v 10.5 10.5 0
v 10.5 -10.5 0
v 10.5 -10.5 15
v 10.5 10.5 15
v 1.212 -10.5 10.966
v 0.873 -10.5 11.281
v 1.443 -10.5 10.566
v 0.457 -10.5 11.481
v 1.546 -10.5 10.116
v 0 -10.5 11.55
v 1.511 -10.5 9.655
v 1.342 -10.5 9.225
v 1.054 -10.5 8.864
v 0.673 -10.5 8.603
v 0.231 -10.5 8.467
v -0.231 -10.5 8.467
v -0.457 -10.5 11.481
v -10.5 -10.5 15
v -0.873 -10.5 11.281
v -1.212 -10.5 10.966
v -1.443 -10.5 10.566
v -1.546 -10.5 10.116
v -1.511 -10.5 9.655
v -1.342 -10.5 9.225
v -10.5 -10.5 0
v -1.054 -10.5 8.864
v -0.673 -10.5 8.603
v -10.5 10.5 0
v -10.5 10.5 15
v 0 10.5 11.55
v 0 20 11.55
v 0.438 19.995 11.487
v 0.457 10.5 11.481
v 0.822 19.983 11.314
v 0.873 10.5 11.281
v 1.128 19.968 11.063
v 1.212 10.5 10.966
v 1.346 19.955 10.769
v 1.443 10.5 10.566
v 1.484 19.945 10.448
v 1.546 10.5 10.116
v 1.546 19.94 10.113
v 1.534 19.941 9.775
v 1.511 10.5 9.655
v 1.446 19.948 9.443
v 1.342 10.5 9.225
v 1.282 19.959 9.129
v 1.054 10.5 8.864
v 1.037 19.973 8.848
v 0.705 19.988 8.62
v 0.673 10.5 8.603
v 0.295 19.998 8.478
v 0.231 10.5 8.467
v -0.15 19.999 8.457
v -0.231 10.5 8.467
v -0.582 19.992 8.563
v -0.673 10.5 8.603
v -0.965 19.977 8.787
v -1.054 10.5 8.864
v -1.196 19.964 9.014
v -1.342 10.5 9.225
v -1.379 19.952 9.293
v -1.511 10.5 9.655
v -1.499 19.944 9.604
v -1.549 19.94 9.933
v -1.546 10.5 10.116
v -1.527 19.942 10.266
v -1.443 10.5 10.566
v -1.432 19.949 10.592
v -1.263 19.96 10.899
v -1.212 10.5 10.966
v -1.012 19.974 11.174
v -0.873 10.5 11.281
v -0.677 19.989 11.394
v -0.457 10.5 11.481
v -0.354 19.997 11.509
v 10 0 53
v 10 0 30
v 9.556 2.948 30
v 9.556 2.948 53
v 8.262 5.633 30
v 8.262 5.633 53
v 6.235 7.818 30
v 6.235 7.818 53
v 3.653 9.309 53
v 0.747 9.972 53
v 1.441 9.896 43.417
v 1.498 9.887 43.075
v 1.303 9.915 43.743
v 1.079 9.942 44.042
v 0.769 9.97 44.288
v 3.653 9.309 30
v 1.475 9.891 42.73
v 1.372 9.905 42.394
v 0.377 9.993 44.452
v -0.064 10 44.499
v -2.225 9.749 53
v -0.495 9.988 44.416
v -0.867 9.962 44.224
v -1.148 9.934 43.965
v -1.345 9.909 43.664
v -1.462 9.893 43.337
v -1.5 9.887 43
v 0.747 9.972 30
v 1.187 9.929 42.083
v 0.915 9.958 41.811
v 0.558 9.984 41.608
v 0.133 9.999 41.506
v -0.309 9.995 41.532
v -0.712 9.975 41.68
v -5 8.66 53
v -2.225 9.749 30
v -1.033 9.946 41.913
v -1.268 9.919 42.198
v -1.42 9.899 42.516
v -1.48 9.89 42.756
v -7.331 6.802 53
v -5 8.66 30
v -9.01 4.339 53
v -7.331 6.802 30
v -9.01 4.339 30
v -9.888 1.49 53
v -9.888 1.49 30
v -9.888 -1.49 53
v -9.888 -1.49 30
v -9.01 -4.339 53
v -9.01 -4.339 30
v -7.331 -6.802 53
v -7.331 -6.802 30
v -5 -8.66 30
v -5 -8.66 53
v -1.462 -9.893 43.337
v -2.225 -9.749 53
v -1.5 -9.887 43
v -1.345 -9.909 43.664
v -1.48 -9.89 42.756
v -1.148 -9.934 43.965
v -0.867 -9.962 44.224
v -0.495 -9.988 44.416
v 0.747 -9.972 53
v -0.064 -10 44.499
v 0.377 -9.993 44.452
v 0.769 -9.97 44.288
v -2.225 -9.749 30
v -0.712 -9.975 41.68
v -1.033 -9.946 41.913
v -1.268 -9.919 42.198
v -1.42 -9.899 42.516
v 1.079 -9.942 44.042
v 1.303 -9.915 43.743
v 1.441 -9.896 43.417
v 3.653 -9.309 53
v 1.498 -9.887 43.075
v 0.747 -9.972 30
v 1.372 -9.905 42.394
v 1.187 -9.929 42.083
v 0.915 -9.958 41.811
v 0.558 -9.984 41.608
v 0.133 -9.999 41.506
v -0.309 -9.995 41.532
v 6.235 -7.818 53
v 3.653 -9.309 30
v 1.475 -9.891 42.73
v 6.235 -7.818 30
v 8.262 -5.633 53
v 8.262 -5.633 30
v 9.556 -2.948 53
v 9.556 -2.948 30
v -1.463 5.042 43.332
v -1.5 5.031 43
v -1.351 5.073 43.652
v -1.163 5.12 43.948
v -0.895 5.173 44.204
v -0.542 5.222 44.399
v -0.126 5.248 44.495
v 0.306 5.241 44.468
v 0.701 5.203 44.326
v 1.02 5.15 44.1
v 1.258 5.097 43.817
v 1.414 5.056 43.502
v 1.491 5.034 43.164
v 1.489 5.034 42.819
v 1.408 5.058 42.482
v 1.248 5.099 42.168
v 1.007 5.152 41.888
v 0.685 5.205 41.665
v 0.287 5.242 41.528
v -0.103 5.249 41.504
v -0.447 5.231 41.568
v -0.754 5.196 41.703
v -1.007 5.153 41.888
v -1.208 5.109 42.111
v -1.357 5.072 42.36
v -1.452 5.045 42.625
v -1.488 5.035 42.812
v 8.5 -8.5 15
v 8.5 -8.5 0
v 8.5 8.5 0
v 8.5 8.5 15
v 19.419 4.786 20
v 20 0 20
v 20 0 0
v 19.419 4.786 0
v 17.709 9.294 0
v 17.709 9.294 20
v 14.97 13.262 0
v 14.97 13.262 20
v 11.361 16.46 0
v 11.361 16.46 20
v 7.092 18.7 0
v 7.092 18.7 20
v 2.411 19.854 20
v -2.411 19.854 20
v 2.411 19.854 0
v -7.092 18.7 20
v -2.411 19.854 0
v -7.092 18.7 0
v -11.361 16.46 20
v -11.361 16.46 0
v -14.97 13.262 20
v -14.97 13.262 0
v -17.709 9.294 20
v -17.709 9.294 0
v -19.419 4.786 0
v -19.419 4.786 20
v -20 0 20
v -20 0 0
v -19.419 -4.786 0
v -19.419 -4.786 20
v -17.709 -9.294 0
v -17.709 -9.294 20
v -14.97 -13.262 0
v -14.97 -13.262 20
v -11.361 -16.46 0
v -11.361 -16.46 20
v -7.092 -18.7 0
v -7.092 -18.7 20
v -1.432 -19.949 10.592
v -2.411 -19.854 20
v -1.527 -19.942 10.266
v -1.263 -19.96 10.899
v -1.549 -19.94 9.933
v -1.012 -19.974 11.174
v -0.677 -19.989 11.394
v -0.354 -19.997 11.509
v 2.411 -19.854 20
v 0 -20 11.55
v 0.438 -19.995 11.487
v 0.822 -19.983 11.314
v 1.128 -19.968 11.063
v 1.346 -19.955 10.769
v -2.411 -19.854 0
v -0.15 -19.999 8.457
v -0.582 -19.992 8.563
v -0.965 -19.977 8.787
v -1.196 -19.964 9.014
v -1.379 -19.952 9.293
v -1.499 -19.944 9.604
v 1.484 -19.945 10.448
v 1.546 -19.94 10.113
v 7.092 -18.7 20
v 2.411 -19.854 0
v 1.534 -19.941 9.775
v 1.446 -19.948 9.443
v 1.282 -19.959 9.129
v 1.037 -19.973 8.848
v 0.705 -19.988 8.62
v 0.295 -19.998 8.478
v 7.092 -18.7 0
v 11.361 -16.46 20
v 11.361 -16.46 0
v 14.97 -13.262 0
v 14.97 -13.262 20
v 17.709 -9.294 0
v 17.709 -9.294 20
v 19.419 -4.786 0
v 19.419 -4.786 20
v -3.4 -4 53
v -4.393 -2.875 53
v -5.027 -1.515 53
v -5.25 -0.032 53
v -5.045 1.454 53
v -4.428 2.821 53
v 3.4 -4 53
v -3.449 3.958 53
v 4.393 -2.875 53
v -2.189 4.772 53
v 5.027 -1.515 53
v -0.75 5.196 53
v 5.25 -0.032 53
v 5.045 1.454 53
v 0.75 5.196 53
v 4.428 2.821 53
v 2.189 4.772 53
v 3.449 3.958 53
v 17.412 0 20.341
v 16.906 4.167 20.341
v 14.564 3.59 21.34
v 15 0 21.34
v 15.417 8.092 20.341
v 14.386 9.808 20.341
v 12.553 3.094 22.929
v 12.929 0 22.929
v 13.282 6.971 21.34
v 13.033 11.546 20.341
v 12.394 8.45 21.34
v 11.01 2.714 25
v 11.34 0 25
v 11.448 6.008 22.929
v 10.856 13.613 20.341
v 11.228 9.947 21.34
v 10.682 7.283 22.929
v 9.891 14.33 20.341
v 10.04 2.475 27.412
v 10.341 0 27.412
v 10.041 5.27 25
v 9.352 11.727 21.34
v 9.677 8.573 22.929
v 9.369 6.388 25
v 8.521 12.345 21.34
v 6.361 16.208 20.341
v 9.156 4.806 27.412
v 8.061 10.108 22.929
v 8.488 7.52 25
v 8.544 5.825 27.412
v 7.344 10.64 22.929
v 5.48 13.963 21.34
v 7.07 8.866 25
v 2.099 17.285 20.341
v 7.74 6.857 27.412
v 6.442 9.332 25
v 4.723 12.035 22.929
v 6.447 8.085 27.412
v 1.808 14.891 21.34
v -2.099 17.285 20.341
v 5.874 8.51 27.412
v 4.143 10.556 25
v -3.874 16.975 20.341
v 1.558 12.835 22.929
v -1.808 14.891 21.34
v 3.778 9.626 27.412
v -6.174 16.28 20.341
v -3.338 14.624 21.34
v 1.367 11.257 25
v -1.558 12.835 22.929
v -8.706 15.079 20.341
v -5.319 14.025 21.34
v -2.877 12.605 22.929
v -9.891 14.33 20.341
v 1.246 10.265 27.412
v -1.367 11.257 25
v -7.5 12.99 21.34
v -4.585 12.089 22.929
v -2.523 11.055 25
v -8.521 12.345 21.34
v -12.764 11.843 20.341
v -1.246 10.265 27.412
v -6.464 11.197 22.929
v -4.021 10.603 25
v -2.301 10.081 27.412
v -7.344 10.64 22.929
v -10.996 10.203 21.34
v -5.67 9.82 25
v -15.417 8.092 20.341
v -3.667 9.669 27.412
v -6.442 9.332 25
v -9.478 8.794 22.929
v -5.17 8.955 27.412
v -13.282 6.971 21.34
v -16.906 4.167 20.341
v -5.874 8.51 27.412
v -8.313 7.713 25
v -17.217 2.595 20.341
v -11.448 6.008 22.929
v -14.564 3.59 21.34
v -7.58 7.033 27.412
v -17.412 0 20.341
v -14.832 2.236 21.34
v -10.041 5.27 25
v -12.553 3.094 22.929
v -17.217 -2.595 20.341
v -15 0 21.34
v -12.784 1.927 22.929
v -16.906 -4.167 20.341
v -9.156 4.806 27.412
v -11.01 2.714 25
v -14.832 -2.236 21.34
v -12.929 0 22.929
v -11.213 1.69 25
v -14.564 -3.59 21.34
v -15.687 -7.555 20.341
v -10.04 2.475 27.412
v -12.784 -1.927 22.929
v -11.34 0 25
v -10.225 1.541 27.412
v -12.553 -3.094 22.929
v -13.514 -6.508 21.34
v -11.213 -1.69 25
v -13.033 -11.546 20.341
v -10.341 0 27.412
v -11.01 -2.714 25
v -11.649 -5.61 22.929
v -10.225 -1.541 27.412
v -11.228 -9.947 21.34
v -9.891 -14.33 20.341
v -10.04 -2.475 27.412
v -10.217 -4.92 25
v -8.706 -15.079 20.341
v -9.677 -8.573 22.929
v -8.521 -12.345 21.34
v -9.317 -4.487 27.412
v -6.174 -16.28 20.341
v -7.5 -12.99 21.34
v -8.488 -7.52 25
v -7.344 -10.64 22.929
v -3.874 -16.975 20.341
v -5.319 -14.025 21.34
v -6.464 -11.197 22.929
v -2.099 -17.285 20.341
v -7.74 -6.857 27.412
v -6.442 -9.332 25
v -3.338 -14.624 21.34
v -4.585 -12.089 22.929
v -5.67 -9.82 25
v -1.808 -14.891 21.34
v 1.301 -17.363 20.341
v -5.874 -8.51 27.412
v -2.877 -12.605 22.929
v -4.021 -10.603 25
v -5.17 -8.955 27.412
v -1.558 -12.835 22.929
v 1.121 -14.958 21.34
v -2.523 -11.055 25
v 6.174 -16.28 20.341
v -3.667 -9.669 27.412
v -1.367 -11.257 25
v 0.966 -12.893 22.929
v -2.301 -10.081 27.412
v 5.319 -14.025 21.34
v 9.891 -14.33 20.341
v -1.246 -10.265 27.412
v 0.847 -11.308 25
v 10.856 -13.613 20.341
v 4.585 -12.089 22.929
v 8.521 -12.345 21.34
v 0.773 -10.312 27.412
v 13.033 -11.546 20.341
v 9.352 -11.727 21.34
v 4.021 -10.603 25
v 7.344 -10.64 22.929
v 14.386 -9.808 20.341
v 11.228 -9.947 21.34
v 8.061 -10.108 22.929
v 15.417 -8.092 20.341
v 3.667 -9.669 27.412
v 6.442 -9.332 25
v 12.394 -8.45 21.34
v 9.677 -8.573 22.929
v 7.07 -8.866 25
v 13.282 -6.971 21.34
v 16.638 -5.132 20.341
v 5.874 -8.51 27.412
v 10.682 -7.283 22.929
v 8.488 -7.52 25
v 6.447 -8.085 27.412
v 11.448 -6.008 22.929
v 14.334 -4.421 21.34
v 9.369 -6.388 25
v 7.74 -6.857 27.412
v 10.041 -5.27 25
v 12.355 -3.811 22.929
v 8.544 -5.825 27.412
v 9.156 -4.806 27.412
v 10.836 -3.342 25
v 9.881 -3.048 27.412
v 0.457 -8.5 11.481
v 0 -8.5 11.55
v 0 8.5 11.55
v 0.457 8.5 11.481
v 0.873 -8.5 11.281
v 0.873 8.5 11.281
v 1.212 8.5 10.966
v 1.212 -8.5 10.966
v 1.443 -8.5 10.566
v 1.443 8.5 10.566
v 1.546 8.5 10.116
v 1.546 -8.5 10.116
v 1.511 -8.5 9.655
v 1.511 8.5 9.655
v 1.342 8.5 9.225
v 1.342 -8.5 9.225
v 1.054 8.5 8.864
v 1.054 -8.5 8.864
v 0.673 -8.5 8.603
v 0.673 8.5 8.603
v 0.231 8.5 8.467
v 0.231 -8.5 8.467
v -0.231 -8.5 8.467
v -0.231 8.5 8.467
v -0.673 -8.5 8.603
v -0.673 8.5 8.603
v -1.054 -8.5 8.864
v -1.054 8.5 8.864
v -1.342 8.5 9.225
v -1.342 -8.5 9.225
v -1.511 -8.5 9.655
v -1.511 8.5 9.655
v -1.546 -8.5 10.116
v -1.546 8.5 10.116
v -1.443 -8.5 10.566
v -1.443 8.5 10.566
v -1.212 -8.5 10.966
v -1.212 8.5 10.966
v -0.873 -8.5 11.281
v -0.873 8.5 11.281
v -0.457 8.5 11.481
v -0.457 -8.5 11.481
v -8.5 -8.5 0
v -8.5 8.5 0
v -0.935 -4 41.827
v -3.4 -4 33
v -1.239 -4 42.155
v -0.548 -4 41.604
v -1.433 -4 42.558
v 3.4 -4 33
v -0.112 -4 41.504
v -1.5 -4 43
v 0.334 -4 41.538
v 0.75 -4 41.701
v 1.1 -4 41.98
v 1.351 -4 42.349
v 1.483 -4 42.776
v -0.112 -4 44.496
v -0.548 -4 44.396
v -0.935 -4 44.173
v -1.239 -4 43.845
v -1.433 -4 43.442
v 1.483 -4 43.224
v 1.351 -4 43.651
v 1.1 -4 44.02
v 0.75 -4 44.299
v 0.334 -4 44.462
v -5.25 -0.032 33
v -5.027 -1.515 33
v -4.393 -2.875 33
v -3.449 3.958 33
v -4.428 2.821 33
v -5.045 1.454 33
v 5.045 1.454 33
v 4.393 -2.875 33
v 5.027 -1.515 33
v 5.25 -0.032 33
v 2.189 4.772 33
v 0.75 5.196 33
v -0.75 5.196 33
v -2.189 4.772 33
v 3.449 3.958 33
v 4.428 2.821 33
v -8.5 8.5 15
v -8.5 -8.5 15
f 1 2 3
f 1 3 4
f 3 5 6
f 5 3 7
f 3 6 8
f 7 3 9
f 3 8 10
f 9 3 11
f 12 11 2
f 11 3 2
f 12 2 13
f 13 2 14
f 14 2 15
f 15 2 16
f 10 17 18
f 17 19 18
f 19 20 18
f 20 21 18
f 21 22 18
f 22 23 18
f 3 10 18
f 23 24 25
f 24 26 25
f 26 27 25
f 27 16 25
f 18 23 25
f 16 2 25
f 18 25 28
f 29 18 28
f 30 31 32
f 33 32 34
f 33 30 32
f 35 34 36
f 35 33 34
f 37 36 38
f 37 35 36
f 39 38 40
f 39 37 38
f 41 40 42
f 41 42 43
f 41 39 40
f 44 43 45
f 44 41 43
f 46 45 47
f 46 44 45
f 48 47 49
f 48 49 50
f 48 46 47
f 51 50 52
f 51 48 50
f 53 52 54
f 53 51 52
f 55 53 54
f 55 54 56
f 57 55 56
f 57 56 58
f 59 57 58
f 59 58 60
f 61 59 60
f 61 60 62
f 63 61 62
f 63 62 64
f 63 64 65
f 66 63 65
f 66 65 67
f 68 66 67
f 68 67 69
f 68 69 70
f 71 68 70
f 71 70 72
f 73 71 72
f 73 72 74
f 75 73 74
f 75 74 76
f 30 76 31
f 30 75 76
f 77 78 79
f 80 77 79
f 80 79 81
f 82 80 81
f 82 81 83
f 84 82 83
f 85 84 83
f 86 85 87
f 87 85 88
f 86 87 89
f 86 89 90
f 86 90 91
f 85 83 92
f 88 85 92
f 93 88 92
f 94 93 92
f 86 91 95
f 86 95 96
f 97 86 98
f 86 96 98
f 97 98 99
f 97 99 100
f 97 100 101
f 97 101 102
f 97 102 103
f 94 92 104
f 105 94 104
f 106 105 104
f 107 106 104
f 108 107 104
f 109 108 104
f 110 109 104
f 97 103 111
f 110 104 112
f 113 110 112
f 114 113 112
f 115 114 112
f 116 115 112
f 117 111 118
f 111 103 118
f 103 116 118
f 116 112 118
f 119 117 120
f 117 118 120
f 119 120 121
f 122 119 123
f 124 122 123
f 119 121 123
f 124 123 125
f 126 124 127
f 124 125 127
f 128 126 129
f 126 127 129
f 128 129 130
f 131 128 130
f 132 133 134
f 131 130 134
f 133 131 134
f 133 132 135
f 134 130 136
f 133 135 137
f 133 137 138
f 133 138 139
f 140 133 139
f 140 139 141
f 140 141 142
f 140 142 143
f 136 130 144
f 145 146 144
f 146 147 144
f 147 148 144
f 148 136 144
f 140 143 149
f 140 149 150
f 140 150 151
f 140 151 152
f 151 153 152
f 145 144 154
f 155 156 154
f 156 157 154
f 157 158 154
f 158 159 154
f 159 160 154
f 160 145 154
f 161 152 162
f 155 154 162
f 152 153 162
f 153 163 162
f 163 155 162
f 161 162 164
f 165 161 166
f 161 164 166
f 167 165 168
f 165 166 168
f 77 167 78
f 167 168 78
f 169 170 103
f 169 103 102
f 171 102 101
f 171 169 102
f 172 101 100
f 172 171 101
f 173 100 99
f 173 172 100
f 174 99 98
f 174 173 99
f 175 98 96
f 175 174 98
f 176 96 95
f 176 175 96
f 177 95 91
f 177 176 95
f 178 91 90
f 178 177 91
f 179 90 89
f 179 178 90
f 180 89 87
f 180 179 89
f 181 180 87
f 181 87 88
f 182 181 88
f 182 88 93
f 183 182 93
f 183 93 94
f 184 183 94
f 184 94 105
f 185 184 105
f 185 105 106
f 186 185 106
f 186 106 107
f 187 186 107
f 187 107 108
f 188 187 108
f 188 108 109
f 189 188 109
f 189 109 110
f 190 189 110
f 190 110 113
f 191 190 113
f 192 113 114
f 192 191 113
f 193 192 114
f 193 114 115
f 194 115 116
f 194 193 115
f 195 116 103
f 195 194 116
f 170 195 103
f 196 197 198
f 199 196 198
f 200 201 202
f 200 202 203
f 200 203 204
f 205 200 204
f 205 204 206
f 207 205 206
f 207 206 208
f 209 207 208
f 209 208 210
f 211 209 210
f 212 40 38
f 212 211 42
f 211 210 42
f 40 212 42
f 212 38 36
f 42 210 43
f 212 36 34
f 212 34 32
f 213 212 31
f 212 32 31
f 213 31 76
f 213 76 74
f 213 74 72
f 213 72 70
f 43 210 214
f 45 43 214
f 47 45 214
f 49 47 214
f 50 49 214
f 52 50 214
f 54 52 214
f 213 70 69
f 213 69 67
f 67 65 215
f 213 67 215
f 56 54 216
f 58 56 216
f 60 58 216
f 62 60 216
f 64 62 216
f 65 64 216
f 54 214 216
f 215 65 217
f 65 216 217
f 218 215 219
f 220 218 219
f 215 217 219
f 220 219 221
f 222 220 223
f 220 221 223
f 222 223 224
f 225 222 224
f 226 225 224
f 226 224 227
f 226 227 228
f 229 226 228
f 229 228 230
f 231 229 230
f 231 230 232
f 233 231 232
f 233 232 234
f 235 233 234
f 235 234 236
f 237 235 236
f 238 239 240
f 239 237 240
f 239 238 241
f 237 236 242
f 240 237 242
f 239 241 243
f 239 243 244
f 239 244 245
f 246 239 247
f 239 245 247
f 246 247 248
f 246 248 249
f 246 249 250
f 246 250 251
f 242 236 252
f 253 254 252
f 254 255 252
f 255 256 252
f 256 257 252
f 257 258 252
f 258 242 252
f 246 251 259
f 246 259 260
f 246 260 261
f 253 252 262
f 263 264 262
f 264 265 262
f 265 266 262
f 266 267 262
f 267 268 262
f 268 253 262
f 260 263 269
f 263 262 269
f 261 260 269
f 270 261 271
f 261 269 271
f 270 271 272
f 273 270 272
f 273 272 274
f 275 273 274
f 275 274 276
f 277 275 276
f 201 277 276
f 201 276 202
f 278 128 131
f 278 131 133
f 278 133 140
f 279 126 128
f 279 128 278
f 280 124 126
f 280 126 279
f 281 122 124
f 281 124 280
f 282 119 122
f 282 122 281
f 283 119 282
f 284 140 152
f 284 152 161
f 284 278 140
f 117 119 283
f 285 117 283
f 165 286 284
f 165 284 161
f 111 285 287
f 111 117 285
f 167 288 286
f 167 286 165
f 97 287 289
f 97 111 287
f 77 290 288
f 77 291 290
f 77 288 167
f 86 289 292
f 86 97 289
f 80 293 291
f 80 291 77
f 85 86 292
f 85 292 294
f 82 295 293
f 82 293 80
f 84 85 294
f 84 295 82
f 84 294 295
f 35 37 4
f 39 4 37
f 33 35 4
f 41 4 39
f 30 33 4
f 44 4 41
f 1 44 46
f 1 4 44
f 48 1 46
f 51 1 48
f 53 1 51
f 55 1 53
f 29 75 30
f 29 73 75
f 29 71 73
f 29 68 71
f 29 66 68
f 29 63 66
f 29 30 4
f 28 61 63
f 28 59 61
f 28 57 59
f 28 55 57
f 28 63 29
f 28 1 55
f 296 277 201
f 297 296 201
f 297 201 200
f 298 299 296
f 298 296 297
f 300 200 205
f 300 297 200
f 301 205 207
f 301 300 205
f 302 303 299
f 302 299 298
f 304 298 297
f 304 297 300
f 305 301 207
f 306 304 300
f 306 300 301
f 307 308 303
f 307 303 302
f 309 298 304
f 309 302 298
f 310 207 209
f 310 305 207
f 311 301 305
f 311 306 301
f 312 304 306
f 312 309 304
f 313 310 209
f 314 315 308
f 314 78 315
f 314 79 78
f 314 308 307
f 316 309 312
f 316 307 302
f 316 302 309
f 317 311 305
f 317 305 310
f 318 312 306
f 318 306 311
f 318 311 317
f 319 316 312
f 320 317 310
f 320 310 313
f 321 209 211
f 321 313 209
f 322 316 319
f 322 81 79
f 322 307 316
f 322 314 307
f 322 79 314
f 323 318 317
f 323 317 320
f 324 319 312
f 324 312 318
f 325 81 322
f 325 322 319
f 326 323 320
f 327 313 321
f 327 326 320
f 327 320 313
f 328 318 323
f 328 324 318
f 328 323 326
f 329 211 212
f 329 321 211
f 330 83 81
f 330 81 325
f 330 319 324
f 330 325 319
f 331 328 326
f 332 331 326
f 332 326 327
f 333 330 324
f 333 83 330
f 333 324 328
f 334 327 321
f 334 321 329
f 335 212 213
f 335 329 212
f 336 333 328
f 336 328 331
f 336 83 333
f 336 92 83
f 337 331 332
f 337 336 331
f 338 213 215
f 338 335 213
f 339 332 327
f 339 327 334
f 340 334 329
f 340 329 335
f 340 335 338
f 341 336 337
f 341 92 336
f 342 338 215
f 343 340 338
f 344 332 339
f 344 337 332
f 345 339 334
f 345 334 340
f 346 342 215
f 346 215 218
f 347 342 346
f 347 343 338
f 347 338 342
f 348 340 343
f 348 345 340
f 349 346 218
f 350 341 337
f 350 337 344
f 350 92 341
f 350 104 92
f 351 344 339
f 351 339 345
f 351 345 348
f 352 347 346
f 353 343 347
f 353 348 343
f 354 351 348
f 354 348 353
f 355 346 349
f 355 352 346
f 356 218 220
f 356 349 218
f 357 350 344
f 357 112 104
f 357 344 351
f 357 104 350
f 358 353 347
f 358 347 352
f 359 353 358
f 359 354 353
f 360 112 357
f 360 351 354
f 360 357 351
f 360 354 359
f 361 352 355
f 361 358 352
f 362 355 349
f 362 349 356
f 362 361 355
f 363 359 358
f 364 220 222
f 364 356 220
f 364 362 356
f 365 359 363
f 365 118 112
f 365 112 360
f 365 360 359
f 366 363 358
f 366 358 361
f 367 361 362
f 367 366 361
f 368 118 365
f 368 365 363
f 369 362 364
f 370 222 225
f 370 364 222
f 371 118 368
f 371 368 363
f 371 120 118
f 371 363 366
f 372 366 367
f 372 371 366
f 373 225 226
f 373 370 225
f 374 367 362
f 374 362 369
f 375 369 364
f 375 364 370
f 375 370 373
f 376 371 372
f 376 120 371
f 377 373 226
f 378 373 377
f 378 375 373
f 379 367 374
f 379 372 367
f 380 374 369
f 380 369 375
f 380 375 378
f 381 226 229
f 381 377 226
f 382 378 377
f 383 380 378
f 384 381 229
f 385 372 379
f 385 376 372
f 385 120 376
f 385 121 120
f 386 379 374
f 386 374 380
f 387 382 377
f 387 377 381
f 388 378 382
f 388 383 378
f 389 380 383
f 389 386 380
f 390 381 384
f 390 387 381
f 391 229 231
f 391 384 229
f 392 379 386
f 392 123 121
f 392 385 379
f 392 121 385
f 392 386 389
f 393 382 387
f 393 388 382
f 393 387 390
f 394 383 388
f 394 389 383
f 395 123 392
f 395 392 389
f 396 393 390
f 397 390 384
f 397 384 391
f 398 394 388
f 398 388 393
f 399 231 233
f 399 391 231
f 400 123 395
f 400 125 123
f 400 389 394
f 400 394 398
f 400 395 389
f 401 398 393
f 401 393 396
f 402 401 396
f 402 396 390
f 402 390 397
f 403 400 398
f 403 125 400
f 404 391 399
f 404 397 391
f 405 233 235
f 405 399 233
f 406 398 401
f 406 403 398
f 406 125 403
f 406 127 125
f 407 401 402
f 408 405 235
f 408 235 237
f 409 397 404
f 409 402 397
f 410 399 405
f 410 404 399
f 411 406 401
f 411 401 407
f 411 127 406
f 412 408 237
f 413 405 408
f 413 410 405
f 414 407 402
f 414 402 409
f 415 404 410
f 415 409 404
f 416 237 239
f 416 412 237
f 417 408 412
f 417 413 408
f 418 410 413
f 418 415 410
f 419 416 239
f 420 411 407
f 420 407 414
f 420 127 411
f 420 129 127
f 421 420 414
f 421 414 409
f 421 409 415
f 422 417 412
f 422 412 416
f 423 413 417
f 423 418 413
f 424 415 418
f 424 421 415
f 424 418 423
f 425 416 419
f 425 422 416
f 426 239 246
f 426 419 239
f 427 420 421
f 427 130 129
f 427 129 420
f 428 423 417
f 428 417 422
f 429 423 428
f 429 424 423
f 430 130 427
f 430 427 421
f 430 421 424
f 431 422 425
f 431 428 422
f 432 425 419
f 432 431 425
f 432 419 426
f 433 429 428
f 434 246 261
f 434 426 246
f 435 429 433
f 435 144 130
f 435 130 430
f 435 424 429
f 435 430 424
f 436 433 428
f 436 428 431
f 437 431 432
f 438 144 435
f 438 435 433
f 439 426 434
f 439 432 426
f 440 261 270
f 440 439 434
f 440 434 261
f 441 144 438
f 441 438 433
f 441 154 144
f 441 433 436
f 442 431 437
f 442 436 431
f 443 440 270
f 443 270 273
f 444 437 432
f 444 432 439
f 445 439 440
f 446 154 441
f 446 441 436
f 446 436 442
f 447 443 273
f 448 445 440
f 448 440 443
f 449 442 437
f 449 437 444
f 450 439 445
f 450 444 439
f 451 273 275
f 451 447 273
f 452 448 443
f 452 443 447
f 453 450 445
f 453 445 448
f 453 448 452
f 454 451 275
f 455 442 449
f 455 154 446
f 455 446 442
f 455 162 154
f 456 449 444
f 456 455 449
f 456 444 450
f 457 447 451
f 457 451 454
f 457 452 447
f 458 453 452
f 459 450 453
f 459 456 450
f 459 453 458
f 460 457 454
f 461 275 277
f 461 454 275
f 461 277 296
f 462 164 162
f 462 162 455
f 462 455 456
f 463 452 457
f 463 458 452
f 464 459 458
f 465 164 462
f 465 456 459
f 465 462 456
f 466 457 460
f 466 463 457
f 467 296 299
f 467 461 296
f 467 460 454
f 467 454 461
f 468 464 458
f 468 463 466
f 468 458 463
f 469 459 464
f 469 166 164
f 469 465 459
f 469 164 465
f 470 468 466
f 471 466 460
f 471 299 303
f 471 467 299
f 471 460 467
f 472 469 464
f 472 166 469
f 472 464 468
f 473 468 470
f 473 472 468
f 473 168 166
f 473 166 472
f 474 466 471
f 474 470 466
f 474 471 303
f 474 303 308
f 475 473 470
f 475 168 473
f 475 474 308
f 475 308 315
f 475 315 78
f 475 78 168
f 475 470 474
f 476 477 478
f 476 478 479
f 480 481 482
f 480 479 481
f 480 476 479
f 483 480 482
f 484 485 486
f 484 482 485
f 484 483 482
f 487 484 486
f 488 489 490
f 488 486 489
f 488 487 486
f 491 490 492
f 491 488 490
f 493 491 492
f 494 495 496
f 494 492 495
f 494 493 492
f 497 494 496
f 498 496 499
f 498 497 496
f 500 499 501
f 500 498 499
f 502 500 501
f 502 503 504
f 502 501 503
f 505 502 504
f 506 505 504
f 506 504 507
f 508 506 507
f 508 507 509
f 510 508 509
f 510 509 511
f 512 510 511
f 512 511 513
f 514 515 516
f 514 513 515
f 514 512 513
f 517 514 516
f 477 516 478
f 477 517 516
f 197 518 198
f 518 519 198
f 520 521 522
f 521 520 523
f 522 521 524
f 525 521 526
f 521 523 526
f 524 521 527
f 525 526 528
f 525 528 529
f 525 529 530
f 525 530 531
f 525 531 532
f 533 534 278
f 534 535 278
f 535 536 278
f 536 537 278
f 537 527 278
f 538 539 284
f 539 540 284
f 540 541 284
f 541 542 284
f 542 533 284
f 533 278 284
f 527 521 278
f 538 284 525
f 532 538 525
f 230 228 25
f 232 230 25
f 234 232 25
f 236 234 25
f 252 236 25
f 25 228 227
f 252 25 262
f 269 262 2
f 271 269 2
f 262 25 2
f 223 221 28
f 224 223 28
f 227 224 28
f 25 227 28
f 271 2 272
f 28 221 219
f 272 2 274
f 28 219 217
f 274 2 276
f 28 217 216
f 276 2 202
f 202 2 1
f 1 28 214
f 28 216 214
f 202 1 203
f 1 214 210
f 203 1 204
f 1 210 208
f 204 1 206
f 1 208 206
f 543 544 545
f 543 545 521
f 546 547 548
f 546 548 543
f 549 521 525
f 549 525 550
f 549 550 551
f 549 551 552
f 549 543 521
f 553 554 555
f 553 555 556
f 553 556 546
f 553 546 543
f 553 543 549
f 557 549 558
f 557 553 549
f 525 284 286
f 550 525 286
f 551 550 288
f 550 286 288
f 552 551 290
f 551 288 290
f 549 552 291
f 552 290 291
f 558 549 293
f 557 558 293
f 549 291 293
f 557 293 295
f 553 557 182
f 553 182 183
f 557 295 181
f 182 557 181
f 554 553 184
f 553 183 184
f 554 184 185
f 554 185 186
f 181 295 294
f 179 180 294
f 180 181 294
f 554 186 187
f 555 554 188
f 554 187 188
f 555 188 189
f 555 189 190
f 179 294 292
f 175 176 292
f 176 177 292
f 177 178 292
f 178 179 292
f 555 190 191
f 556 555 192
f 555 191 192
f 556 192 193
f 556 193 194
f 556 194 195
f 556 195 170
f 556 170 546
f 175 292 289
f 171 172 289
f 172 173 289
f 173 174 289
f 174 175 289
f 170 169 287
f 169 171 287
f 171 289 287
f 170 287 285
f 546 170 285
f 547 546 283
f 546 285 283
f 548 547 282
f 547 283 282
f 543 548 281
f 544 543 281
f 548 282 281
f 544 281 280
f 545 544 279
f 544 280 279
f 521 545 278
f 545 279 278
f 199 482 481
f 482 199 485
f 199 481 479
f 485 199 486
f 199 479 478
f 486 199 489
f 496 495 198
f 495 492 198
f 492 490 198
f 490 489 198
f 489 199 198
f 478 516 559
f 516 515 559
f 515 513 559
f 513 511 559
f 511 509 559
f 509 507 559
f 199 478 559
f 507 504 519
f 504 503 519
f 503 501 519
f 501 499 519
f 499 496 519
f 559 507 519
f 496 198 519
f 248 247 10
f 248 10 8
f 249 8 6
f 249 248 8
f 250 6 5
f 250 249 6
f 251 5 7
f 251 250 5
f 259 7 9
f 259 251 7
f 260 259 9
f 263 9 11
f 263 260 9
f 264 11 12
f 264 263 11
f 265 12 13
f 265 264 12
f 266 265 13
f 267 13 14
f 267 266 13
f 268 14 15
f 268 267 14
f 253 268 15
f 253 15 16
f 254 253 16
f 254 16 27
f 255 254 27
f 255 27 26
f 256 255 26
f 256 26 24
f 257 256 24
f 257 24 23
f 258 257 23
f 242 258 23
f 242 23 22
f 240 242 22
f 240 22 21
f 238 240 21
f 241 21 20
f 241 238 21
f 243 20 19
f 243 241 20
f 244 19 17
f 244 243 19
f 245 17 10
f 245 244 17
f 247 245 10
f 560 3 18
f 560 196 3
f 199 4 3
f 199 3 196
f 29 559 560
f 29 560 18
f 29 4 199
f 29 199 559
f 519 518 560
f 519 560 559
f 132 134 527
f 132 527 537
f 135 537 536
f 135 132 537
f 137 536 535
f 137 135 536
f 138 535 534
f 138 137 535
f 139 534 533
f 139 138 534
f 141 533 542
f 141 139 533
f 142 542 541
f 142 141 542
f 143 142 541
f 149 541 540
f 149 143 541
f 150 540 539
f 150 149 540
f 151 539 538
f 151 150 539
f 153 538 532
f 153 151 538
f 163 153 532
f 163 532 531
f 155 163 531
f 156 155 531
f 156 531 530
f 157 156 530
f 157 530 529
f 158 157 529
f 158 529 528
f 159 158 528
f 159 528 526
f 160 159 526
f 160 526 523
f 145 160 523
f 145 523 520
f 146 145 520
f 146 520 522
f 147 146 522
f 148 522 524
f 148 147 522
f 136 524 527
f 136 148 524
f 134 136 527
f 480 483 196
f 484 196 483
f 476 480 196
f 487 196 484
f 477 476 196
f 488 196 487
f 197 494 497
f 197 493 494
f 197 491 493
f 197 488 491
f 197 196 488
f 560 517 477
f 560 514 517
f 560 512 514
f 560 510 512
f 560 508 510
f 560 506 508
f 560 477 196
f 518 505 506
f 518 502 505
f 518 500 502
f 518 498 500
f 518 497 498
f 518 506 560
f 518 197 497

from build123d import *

# Parameters (mm, degrees)
SKETCH_1_R               = 20
EXTRUDE_1_DEPTH          = 20
SKETCH_2_R               = 10
EXTRUDE_2_DEPTH          = 33
SKETCH_4_W               = 21
SKETCH_4_H               = 21
SKETCH_4_W_2             = 17
SKETCH_4_H_2             = 17
CUT_EXTRUDE_3_DEPTH      = 15
CUT_EXTRUDE_4_DEPTH      = 61.074953184
CUT_EXTRUDE_4_DEPTH_BACK = 61.074953184
SKETCH_5_R               = 1.55
FILLET_1_R               = 10
CUT_EXTRUDE_6_DEPTH      = 20
CUT_EXTRUDE_7_DEPTH      = 62.522353742
CUT_EXTRUDE_7_DEPTH_BACK = 62.522353742
SKETCH_9_R               = 1.5


with BuildPart() as part:
    # 草图1 → 凸台-拉伸1 (new body)
    with BuildSketch(Plane.XY):
        Circle(SKETCH_1_R)
    extrude(amount=EXTRUDE_1_DEPTH)

    # 草图2 → 凸台-拉伸2 (add)
    with BuildSketch(Plane.XY.offset(20)):
        Circle(SKETCH_2_R)
    extrude(amount=EXTRUDE_2_DEPTH)

    # 草图4 → 切除-拉伸3 (cut)
    with BuildSketch(Plane(origin=(0, 0, 0), x_dir=(-1, 0, 0), z_dir=(0, 0, -1))):
        Rectangle(SKETCH_4_W, SKETCH_4_H)
        Rectangle(SKETCH_4_W_2, SKETCH_4_H_2, mode=Mode.SUBTRACT)
    extrude(amount=-CUT_EXTRUDE_3_DEPTH, mode=Mode.SUBTRACT)

    # 草图5 → 切除-拉伸4 (cut, two sides: drawn at the far end of the back side and taken through both)
    with BuildSketch(Plane(origin=(0, 0, 0), x_dir=(1, 0, 0), z_dir=(0, 1, 0)).offset(-CUT_EXTRUDE_4_DEPTH_BACK)):
        with Locations(Location((0, -10, 0), (0, 0, 270))):
            Circle(SKETCH_5_R)
    extrude(amount=CUT_EXTRUDE_4_DEPTH + CUT_EXTRUDE_4_DEPTH_BACK, mode=Mode.SUBTRACT)

    # 圆角1
    fillet_1_edges = [part.edges().sort_by_distance(p)[0] for p in [
        (-10, 0, 20),
    ]]
    fillet(fillet_1_edges, radius=FILLET_1_R - 0.0001)  # a hair under: the kernel refuses the full size

    # 草图8 → 切除-拉伸6 (cut)
    with BuildSketch(Plane.XY.offset(53)):
        with BuildLine():
            Line((-3.400367627, -4), (3.400367627, -4))
            ThreePointArc((3.400367627, -4), (0, 5.25), (-3.400367627, -4))
        make_face()
    extrude(amount=-CUT_EXTRUDE_6_DEPTH, mode=Mode.SUBTRACT)

    # 草图9 → 切除-拉伸7 (cut, two sides: drawn at the far end of the back side and taken through both)
    with BuildSketch(Plane(origin=(0, -4, 0), x_dir=(1, 0, 0), z_dir=(0, 1, 0)).offset(-CUT_EXTRUDE_7_DEPTH_BACK)):
        with Locations(Location((0, -43, 0), (0, 0, 180))):
            Circle(SKETCH_9_R)
    extrude(amount=CUT_EXTRUDE_7_DEPTH + CUT_EXTRUDE_7_DEPTH_BACK, mode=Mode.SUBTRACT)


solid = part.part
